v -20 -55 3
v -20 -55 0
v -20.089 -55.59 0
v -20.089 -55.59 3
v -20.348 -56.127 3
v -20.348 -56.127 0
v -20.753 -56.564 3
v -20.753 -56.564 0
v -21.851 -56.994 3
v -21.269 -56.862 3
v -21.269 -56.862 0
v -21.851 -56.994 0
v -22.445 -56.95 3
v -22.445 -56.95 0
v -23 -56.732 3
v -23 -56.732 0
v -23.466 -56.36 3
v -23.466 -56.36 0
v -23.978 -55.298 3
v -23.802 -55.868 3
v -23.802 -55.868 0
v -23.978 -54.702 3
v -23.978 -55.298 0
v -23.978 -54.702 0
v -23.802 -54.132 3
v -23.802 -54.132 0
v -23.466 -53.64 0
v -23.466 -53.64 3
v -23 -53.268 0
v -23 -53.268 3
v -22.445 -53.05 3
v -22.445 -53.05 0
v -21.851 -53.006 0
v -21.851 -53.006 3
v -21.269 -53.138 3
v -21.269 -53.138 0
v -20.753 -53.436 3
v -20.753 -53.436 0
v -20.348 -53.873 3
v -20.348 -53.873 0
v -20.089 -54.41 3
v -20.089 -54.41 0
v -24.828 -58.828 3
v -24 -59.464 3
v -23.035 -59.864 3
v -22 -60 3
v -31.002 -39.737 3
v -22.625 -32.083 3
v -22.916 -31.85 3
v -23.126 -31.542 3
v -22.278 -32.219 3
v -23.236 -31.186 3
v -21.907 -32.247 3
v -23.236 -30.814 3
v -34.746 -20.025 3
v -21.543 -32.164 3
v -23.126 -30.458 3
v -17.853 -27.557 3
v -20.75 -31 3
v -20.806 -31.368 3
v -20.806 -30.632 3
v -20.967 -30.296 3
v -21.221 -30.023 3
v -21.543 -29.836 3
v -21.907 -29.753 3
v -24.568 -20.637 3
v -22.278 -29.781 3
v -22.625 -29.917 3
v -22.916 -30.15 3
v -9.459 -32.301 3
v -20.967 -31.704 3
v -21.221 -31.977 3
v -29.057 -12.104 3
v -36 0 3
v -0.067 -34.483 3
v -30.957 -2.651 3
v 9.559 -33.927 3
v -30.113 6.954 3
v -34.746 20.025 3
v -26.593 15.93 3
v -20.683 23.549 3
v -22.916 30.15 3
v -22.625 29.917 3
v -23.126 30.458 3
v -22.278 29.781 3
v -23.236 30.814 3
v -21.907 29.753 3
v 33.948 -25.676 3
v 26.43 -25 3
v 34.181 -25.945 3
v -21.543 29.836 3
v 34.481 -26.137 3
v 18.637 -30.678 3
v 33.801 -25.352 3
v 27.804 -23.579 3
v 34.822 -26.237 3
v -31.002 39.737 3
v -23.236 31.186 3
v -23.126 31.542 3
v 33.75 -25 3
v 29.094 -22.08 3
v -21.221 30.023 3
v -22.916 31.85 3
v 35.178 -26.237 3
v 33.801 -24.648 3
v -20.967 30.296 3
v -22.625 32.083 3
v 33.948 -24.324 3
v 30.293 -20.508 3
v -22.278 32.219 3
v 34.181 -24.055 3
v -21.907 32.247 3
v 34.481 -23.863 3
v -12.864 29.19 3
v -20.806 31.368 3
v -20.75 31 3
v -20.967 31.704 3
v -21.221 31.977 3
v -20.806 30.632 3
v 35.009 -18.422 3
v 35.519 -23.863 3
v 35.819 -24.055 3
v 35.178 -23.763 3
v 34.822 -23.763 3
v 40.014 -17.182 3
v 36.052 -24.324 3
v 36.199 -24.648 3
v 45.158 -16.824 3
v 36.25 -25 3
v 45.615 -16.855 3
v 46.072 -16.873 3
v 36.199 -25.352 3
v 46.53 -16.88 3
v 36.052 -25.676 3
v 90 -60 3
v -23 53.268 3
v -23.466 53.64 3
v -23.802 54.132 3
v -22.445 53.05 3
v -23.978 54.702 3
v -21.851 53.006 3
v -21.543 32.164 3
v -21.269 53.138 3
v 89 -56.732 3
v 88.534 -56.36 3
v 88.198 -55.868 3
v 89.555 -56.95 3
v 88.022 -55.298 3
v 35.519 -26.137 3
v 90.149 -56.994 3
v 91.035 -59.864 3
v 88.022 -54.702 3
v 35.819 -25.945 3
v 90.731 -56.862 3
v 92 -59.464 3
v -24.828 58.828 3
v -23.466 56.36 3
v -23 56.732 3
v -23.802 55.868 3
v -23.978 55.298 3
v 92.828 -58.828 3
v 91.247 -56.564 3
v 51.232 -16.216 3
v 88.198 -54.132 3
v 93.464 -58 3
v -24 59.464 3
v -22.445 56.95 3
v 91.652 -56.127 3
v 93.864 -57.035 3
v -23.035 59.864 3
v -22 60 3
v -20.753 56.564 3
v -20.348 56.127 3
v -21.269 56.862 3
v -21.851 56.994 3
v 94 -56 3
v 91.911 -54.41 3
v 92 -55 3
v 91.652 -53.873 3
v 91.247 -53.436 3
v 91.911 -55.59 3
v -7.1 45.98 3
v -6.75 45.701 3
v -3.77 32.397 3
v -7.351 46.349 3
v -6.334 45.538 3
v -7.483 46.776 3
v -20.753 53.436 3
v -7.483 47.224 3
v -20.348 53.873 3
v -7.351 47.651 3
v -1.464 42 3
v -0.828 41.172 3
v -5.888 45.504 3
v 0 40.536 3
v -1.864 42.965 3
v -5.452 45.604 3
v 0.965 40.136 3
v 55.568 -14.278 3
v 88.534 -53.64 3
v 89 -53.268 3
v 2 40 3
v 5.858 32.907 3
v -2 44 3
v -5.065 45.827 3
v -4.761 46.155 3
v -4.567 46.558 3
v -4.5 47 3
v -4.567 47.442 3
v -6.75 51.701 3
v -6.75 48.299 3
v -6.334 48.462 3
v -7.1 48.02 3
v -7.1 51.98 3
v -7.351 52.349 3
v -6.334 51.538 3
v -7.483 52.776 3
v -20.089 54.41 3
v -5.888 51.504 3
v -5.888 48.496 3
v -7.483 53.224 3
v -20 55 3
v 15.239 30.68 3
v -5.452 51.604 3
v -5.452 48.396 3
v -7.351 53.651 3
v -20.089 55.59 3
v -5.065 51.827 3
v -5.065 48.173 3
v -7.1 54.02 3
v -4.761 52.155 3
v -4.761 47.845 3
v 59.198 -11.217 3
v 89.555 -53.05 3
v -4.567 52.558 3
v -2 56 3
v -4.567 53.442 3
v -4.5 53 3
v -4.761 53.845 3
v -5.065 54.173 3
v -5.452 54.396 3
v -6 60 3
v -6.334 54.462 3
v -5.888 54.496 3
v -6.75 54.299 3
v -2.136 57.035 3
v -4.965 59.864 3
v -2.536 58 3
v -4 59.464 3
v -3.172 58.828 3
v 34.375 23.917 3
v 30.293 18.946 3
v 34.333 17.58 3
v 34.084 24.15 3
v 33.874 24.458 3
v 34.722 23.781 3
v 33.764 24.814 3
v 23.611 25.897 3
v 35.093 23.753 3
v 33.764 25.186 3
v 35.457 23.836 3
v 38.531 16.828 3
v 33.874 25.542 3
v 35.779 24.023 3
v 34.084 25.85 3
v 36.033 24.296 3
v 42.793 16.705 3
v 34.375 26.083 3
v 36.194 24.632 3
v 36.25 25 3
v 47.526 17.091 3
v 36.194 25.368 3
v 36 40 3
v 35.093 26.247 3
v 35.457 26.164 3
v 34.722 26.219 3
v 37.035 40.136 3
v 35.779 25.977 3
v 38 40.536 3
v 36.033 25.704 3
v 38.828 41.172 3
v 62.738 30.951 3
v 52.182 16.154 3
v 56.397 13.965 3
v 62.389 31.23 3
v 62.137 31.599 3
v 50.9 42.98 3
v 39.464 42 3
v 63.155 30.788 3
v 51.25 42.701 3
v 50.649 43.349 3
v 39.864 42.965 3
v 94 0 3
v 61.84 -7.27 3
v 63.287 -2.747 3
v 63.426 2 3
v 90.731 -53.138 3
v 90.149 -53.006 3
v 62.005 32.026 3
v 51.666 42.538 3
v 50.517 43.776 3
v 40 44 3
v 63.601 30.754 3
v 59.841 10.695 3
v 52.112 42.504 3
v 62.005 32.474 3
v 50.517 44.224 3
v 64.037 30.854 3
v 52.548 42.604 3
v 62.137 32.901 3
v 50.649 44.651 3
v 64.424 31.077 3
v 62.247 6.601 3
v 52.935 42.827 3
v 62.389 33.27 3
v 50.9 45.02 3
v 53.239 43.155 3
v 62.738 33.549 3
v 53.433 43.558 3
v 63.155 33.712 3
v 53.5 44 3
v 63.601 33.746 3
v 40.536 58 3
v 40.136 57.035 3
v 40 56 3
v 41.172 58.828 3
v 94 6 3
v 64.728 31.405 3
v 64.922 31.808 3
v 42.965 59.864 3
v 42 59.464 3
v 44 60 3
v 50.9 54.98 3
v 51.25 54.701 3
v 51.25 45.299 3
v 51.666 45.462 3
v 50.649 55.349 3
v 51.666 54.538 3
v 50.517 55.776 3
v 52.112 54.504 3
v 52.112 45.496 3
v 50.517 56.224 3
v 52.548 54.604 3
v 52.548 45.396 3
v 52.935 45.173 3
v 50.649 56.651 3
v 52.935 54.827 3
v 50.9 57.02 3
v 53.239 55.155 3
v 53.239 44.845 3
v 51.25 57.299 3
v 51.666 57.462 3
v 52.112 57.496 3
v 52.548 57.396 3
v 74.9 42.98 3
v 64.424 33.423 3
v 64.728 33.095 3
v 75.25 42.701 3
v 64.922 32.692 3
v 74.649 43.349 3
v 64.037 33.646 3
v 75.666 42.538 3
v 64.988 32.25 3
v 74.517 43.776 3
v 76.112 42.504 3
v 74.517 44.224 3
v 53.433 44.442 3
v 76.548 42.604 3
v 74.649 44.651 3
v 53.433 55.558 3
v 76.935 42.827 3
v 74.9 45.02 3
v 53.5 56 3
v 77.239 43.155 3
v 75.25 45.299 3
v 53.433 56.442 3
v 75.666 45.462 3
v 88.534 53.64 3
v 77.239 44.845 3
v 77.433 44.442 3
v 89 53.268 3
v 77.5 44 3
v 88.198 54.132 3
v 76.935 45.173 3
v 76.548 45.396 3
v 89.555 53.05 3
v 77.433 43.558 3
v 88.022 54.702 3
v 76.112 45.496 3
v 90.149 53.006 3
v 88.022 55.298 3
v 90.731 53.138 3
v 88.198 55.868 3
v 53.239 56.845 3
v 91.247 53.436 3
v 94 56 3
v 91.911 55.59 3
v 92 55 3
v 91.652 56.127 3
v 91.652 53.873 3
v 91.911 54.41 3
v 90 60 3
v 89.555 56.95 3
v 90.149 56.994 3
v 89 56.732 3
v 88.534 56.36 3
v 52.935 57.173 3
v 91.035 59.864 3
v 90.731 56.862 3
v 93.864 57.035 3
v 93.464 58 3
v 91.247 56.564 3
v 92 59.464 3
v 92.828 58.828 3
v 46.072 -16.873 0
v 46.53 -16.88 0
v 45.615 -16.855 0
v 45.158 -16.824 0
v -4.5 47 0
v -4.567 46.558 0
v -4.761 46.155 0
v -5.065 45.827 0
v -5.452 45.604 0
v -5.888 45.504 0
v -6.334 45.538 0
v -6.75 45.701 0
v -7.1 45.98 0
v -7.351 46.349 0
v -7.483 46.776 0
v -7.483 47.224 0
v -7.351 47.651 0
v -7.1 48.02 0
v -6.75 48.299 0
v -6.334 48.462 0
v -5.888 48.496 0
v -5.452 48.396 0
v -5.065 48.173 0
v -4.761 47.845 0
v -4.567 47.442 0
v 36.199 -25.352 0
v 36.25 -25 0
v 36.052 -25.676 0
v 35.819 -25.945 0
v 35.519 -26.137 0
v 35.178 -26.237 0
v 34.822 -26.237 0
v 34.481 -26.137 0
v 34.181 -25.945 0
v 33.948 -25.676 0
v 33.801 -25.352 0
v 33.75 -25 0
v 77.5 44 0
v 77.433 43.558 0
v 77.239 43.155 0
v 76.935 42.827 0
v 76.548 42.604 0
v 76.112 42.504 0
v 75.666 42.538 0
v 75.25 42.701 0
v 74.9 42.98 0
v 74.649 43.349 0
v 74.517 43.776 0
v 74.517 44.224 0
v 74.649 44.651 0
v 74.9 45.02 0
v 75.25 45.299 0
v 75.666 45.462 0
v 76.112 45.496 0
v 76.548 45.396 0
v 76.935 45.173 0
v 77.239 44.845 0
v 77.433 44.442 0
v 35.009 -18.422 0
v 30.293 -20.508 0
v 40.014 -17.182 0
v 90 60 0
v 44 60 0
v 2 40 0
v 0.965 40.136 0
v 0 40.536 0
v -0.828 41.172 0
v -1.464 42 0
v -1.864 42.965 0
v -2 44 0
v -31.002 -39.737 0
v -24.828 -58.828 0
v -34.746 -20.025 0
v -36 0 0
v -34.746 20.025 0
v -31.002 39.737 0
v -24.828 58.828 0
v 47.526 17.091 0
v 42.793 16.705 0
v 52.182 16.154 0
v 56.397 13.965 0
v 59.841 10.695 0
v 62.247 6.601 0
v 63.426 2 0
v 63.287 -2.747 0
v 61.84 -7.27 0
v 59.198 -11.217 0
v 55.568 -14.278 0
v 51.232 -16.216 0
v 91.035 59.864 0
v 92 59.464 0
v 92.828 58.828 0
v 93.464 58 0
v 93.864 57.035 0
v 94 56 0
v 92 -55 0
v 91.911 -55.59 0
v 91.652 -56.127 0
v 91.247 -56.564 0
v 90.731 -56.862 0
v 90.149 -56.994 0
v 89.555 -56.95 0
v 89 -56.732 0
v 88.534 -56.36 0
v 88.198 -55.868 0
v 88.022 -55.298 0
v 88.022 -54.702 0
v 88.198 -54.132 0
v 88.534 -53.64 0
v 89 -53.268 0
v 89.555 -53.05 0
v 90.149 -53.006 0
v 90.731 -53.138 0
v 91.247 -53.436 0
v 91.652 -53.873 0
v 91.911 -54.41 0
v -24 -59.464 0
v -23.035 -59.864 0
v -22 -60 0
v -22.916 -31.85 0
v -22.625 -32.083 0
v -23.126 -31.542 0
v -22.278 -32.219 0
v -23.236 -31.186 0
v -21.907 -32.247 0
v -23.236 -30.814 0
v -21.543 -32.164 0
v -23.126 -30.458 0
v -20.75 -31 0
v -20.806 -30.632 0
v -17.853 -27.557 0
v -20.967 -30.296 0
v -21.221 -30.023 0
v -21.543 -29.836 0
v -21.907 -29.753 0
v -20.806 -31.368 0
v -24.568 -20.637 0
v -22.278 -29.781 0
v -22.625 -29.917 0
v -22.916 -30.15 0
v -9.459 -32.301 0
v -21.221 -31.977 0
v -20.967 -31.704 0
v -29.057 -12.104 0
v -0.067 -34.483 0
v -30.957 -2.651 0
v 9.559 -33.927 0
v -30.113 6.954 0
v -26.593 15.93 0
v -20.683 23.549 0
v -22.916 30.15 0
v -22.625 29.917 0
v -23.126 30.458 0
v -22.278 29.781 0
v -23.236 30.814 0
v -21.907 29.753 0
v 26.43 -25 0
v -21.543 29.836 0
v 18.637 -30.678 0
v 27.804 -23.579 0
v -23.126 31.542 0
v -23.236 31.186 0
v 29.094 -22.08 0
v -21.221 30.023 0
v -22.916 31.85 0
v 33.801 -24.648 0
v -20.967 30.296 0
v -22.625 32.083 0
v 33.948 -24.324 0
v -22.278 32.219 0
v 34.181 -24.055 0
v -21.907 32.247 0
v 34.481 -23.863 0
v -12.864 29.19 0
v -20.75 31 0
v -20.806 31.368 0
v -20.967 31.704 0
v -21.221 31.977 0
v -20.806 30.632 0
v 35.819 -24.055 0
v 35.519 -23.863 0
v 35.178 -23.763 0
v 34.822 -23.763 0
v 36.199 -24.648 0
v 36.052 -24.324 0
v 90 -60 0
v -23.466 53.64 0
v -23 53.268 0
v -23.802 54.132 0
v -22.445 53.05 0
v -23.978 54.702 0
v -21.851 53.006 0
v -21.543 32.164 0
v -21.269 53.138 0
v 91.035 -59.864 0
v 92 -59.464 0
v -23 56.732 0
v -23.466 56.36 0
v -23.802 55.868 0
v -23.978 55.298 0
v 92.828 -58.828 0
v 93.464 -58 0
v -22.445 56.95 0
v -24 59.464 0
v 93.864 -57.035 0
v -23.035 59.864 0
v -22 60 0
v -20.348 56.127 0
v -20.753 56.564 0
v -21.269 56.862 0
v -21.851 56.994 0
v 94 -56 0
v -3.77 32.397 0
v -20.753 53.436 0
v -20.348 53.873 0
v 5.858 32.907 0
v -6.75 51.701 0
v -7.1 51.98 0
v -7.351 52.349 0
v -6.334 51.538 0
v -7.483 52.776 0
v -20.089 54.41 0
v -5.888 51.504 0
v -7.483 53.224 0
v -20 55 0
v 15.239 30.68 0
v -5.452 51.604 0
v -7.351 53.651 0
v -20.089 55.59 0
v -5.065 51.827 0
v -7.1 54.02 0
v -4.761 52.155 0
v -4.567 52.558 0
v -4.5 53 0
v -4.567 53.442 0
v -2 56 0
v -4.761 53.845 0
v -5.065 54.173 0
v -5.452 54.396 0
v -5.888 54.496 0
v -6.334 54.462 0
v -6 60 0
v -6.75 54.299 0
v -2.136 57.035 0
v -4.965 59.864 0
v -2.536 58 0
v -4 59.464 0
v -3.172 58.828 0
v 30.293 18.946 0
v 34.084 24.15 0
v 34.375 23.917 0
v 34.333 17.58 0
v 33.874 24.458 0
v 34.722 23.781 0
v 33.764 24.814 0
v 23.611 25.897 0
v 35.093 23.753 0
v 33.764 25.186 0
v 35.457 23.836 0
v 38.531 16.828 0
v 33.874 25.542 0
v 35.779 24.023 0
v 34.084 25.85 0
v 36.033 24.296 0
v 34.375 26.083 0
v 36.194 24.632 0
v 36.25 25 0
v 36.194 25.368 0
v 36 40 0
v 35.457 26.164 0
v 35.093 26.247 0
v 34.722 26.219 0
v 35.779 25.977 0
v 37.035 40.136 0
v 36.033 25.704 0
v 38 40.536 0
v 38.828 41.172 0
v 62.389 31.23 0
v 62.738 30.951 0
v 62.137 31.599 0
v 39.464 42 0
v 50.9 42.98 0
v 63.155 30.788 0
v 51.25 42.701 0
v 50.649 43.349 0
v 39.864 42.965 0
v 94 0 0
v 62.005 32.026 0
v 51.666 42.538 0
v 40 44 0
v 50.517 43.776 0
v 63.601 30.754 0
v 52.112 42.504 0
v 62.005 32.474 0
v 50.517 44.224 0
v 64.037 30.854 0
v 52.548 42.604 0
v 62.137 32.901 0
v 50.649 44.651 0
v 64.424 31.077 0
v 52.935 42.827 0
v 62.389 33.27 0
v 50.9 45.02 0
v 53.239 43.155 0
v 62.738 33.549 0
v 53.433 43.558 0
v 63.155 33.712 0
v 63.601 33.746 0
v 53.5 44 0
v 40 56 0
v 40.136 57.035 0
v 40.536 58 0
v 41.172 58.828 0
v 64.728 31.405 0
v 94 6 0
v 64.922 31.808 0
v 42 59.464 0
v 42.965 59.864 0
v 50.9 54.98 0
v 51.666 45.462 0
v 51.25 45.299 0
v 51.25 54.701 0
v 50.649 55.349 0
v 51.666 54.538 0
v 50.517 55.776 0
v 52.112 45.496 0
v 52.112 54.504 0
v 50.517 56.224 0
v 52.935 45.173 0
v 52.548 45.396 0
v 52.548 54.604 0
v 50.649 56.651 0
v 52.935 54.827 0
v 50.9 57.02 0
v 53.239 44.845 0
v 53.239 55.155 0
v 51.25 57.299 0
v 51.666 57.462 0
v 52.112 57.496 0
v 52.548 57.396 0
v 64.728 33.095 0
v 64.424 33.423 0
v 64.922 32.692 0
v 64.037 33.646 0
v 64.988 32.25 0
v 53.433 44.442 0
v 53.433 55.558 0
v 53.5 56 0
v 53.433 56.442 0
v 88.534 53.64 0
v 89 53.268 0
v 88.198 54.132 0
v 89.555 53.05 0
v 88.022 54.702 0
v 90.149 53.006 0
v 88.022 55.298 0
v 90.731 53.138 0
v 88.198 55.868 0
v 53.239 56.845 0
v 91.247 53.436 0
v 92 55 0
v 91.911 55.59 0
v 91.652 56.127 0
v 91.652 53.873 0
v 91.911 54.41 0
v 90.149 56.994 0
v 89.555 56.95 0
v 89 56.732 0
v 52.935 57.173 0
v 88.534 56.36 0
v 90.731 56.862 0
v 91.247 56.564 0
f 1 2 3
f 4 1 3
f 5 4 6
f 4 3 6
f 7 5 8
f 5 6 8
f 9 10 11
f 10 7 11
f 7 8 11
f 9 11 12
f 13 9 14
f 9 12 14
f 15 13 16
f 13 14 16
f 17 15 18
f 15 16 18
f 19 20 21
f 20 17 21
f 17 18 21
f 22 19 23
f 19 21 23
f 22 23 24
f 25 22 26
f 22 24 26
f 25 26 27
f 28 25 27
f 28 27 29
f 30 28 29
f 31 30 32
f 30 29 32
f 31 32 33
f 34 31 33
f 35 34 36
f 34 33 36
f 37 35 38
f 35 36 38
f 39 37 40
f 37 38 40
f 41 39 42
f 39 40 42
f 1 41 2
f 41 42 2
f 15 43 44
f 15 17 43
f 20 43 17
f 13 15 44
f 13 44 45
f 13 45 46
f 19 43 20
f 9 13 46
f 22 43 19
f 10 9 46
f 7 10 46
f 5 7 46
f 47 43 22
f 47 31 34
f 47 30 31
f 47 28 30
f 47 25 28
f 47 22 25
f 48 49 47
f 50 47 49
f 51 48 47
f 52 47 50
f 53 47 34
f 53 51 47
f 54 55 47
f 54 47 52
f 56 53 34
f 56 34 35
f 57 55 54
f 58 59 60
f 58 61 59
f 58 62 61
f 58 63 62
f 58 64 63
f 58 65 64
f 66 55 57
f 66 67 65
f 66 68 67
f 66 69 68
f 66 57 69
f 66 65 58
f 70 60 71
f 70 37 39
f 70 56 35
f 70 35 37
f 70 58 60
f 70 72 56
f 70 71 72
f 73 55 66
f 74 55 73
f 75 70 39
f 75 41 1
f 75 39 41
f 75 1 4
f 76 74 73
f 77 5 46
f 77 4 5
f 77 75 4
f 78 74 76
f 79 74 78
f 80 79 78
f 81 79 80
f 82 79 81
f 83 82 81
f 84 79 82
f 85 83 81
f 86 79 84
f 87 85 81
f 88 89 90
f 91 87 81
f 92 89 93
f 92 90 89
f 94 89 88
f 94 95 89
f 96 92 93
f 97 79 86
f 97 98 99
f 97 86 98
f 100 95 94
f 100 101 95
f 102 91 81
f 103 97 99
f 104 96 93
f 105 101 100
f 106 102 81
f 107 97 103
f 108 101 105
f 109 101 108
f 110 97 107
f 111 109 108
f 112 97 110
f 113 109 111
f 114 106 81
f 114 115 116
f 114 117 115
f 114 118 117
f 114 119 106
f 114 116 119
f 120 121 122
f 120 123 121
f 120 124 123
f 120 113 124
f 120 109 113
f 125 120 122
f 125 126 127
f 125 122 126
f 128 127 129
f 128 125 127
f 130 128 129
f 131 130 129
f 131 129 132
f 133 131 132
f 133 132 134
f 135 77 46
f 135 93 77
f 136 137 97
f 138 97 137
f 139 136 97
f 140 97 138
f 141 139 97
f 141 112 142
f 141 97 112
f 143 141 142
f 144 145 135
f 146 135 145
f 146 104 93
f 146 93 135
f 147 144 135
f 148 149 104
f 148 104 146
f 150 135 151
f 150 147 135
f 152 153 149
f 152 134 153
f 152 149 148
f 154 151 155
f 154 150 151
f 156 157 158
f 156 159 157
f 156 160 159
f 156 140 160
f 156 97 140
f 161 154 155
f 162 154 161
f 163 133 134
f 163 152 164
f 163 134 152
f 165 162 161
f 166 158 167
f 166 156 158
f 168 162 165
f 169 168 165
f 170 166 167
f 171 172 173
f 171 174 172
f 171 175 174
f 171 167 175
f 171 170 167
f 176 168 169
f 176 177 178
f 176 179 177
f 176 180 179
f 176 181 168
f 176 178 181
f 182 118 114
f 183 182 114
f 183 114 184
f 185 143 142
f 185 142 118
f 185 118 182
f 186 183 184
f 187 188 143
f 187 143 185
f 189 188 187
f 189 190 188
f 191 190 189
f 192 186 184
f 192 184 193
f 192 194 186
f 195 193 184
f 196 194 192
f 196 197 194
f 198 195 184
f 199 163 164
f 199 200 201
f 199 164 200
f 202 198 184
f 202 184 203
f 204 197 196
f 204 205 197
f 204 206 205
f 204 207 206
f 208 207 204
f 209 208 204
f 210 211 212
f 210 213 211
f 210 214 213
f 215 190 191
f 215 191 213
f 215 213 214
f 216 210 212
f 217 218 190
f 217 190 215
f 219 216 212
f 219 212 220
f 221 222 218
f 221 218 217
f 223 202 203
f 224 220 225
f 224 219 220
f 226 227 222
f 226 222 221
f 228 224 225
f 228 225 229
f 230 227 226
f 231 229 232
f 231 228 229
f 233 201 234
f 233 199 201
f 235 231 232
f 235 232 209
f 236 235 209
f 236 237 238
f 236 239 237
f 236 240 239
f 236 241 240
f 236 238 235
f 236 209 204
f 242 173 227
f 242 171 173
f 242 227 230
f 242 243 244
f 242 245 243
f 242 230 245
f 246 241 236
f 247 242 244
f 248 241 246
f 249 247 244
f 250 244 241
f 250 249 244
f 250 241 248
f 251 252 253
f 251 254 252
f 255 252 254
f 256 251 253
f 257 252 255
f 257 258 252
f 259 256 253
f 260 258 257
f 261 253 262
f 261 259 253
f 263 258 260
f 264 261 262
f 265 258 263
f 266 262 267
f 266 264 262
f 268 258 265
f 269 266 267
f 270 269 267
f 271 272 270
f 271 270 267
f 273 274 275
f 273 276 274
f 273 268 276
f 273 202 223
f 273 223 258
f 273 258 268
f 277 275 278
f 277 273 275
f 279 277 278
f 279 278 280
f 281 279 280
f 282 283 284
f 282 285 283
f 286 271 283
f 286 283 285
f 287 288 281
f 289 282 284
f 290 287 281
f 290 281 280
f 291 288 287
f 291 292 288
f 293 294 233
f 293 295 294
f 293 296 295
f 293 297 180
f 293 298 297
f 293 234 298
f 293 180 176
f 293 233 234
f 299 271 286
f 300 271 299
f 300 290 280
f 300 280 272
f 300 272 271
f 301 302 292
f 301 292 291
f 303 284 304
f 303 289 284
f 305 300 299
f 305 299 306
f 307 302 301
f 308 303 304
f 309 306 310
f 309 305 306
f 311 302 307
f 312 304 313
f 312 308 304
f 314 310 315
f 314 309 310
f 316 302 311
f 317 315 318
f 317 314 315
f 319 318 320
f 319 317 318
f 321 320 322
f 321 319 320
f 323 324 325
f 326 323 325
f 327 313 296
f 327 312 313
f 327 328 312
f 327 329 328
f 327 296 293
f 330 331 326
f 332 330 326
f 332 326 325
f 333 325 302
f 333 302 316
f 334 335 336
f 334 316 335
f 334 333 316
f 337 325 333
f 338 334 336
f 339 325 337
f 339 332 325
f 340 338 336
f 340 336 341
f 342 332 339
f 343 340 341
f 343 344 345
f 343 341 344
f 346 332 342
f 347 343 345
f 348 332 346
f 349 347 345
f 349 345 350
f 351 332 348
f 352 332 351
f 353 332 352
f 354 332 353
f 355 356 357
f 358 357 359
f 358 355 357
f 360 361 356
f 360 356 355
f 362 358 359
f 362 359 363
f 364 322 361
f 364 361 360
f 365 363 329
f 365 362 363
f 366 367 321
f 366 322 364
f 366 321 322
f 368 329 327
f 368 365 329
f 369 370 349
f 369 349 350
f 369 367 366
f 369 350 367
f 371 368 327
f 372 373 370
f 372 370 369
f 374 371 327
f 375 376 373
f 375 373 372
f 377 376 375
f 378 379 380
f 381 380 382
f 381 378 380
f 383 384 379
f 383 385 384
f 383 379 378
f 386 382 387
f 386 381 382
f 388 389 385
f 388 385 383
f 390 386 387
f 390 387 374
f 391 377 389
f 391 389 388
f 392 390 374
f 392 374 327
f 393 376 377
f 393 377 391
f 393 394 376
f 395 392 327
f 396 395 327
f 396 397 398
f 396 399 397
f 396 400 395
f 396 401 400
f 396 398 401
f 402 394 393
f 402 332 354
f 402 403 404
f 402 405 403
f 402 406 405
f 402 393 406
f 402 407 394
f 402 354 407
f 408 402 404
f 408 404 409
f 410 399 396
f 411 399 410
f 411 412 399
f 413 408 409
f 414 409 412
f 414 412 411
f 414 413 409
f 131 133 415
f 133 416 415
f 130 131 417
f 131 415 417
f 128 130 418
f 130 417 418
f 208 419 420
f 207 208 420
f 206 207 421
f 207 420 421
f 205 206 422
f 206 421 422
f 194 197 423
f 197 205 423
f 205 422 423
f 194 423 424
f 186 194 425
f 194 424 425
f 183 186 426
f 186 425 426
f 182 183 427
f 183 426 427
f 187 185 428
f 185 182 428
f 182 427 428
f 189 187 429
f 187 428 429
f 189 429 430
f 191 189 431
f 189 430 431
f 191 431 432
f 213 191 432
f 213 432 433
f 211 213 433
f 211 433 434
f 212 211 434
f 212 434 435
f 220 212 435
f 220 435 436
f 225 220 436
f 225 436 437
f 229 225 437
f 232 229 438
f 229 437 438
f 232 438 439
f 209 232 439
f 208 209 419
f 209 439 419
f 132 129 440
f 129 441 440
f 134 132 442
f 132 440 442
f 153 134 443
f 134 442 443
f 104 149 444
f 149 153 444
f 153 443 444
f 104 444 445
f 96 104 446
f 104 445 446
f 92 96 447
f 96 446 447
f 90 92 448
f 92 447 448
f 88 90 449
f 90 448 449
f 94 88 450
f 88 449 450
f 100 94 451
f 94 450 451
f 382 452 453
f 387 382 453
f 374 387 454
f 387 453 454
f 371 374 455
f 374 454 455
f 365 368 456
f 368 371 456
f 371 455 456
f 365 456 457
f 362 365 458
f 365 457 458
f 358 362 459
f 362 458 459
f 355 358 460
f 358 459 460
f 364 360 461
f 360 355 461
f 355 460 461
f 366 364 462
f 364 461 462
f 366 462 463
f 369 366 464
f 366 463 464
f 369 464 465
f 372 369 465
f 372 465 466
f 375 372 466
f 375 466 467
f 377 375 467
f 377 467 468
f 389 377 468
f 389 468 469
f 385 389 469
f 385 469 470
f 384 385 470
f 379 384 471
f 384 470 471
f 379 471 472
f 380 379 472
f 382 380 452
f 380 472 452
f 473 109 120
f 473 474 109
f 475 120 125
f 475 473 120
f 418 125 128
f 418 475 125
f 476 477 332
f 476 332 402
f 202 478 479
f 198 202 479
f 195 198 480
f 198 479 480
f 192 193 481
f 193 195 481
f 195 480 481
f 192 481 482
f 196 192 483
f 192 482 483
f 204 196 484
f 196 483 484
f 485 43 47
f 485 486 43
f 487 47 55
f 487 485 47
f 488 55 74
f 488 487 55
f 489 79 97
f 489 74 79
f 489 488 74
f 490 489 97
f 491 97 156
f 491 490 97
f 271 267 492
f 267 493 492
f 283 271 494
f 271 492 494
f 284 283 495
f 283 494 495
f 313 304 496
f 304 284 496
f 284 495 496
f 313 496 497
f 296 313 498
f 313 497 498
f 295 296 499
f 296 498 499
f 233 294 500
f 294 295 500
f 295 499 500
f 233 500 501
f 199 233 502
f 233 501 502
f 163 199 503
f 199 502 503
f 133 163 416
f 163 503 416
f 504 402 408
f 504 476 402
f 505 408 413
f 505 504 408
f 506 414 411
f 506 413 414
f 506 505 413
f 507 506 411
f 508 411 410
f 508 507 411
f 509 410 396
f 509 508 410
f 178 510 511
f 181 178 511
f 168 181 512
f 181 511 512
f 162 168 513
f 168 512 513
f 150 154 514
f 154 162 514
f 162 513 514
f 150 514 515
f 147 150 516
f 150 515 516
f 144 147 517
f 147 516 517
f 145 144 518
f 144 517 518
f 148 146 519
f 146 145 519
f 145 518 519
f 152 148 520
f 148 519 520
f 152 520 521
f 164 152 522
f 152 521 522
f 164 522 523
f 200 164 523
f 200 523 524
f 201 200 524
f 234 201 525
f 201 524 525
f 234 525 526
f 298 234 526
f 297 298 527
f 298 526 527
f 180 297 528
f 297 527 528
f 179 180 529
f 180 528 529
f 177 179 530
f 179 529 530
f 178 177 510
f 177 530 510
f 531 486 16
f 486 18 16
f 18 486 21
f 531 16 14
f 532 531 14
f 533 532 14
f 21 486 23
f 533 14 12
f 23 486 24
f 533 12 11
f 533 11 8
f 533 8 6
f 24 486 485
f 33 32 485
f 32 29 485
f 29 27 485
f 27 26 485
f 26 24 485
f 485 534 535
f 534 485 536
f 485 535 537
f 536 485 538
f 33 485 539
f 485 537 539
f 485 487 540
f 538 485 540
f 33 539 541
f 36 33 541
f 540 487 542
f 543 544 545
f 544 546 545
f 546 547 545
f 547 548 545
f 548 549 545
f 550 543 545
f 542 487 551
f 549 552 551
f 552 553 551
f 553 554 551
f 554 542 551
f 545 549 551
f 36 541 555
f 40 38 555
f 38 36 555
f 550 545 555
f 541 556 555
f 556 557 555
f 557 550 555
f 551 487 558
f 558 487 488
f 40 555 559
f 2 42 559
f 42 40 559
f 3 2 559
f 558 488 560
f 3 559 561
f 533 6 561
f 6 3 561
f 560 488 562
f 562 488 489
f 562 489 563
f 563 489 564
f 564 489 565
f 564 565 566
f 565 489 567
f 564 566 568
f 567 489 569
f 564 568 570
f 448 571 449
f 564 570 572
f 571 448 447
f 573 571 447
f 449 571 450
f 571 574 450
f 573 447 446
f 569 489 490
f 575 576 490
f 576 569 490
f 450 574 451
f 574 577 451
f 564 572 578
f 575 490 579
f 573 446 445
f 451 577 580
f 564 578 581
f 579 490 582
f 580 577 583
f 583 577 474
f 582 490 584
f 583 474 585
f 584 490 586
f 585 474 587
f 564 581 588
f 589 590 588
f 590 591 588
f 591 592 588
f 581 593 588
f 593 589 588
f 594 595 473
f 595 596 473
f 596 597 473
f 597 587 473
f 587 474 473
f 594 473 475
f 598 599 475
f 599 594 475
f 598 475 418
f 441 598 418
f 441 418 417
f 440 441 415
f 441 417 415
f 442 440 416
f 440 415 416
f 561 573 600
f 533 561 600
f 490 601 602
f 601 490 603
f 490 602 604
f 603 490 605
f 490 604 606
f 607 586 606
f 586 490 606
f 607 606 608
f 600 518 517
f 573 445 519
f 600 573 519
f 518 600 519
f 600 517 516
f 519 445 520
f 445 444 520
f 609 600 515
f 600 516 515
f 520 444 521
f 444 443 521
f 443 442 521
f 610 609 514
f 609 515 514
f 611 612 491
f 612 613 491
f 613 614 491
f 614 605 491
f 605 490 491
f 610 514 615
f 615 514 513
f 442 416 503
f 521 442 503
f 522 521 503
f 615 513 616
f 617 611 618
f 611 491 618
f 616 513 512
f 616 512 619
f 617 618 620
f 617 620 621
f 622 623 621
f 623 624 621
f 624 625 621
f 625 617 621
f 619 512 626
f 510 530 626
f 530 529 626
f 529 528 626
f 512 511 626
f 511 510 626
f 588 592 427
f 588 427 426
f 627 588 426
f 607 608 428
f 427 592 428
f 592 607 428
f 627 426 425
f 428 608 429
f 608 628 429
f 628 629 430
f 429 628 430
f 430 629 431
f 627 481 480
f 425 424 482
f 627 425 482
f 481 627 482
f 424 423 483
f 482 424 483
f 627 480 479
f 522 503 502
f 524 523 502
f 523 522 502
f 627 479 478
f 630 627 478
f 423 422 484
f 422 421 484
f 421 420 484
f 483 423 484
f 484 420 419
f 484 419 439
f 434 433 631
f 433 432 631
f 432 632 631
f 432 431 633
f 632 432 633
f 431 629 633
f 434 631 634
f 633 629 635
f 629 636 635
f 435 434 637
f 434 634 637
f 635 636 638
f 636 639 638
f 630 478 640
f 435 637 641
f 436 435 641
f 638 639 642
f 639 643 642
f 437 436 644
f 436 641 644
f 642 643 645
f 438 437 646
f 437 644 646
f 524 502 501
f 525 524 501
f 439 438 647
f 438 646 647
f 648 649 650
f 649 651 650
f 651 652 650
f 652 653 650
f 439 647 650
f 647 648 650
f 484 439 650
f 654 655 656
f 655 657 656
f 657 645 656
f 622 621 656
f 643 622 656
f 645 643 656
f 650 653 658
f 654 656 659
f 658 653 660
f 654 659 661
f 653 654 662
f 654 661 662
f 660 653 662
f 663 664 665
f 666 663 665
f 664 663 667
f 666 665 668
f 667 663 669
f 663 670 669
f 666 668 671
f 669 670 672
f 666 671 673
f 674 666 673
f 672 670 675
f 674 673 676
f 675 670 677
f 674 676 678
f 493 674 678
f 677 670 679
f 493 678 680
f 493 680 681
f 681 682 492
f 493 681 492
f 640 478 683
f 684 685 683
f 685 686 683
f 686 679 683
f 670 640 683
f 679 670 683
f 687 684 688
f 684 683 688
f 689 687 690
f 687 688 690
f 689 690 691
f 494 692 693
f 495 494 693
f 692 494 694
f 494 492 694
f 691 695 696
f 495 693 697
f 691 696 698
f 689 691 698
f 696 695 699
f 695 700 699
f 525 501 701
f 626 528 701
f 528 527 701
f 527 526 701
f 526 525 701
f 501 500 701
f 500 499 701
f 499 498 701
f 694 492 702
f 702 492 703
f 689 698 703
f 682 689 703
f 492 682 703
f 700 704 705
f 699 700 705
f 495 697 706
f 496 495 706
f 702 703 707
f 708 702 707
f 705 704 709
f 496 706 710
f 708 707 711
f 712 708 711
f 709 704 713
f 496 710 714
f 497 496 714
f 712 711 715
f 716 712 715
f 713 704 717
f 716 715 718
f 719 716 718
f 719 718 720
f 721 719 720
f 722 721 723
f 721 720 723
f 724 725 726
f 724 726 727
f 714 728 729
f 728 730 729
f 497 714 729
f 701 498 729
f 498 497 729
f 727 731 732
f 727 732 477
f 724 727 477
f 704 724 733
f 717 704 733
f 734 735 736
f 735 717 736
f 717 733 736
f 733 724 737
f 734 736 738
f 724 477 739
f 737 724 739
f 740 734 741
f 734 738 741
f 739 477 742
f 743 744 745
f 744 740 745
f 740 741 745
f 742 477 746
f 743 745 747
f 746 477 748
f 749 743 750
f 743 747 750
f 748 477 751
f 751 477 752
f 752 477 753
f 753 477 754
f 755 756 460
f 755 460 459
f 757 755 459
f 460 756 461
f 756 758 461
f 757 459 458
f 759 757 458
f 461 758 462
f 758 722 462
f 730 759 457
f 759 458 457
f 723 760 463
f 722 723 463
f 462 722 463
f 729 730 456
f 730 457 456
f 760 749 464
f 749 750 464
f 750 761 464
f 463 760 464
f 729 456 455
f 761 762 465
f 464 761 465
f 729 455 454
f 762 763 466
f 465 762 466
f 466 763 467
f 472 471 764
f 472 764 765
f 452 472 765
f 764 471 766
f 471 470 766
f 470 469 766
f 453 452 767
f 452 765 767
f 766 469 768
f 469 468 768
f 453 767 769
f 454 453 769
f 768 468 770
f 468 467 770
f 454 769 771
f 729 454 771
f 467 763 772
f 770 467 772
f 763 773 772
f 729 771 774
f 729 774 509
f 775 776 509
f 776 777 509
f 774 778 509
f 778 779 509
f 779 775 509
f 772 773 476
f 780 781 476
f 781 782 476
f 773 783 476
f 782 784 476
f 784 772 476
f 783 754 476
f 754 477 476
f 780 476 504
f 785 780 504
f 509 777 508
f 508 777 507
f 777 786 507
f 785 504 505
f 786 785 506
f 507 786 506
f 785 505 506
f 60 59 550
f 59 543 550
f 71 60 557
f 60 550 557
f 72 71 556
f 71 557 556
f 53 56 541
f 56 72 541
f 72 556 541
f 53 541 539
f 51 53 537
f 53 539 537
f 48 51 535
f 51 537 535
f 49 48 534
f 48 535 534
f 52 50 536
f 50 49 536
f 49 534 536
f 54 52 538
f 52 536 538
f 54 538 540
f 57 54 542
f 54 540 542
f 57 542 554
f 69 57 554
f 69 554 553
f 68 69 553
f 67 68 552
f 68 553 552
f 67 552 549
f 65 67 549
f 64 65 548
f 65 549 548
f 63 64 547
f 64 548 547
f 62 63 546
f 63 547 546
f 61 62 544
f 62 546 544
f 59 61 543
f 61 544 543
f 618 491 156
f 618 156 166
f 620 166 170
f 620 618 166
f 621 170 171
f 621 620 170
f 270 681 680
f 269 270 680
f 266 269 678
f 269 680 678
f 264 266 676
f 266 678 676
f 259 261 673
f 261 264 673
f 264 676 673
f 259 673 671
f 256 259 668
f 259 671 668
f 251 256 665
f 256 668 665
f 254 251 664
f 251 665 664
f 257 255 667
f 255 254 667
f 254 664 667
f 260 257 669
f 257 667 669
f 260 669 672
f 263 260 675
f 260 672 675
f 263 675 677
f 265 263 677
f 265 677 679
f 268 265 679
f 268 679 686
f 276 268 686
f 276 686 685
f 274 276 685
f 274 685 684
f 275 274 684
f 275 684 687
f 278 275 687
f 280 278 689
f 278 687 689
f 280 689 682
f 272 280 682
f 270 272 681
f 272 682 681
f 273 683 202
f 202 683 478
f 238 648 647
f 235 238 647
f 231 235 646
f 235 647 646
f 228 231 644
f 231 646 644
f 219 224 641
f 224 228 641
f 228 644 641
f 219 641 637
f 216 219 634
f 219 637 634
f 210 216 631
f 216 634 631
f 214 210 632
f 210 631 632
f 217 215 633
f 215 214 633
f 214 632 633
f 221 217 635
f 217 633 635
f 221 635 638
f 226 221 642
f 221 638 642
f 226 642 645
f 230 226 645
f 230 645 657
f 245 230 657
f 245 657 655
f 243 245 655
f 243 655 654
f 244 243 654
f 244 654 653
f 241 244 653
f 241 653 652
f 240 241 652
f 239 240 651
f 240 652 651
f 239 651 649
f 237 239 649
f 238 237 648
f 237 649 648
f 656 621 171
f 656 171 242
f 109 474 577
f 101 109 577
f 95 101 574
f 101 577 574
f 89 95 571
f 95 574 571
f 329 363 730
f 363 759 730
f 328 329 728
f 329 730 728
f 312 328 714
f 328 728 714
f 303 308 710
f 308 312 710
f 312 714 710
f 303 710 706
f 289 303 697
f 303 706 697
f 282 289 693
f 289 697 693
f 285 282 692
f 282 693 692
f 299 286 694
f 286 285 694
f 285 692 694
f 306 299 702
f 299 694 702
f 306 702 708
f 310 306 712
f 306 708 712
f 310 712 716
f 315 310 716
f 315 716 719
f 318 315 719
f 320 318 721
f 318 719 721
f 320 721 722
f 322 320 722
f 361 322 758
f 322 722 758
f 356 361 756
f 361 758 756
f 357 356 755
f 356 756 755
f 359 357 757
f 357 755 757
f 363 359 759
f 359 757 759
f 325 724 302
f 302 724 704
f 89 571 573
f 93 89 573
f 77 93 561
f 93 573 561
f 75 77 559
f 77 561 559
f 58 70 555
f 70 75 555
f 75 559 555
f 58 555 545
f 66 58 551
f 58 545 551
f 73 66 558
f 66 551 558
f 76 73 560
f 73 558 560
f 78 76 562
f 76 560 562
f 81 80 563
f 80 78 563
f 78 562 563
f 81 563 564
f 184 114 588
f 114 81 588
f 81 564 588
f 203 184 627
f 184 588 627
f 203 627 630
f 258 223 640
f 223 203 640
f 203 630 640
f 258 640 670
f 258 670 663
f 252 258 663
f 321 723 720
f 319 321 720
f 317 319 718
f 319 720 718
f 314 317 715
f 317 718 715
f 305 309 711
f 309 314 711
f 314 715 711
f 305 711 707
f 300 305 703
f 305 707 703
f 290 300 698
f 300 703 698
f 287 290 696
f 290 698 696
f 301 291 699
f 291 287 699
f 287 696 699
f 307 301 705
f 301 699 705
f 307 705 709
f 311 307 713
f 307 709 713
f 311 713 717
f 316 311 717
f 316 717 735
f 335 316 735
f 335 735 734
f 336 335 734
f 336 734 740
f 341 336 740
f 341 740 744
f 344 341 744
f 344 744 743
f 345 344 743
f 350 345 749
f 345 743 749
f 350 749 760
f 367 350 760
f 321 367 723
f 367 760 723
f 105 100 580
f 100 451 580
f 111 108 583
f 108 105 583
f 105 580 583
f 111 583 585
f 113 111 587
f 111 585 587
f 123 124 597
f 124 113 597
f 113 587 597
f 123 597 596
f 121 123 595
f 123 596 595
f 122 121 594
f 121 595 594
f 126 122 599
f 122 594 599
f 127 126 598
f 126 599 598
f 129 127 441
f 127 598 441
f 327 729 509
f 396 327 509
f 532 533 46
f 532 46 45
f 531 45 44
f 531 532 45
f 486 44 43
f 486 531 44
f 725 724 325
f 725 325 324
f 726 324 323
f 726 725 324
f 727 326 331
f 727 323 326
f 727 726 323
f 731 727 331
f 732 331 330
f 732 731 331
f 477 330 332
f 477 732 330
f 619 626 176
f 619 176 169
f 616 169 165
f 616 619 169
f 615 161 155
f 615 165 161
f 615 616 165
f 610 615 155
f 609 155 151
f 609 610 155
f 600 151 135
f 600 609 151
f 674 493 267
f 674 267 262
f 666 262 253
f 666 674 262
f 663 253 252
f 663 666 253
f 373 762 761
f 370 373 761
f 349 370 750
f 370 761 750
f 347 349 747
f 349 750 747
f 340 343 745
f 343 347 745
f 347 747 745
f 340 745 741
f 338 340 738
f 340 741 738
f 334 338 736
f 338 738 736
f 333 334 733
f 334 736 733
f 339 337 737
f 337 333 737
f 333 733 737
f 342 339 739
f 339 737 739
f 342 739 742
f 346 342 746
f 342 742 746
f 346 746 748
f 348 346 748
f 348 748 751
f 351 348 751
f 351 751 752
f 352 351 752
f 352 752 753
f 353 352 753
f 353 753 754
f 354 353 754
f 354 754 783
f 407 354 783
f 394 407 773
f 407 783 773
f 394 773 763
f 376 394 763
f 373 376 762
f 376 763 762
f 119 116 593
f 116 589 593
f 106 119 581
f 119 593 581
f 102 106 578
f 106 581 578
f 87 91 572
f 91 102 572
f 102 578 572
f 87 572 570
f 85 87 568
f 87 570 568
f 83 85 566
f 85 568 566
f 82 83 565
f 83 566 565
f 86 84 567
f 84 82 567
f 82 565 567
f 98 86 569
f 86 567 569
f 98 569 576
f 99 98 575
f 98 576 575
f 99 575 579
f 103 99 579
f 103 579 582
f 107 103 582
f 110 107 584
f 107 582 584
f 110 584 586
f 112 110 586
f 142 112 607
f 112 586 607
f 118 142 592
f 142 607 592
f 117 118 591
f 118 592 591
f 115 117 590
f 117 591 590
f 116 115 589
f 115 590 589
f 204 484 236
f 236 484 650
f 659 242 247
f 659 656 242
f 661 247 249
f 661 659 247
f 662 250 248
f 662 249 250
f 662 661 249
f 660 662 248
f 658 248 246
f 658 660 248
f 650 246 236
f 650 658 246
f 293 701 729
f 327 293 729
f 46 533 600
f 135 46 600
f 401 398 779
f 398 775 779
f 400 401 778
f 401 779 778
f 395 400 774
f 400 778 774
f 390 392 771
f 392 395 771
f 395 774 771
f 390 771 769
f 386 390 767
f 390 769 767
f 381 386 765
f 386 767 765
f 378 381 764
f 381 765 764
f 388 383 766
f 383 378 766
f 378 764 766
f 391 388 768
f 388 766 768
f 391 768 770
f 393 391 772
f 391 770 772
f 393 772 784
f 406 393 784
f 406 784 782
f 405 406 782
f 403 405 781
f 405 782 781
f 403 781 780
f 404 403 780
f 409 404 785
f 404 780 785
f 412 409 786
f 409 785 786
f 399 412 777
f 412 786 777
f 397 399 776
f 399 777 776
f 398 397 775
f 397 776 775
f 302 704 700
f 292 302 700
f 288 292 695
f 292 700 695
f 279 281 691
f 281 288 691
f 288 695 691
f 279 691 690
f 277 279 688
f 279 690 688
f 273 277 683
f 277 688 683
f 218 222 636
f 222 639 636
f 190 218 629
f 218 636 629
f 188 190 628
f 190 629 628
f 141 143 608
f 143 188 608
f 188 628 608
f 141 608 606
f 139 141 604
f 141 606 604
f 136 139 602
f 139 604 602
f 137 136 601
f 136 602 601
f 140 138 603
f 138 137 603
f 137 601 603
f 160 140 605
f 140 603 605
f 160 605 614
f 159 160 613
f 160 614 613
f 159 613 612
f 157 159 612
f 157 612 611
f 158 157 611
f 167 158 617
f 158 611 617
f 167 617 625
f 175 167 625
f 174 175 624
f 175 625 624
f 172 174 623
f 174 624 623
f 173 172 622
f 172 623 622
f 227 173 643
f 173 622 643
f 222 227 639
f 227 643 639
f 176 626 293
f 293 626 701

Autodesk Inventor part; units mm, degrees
ref_plane "YZ Plane" through (0, 0, 0) normal (1, 0, 0) x (0, 1, 0)
ref_plane "XZ Plane" through (0, 0, 0) normal (0, 1, 0) x (-1, 0, 0)
ref_plane "XY Plane" through (0, 0, 0) normal (0, 0, 1) x (1, 0, 0)
sketch "Эскиз1" plane through (0, 0, 0) normal (0, 0, 1) x (1, 0, 0)
  line L0 (0, 29) -> (0, -30)
  circle A0 centre (35, 25) radius 1.25
  circle A1 centre (-22, 31) radius 1.25
  circle A2 centre (-22, -31) radius 1.25
  circle A3 centre (35, -25) radius 1.25
  arc A4 (45.1579, -16.824) -> (42.7931, 16.7046) centre (46.5307, 0.1205) ccw
  line L1 (35, -25) -> (0, -25)
  circle A5 centre (-22, -55) radius 2
  circle A6 centre (90, -55) radius 2
  circle A7 centre (90, 55) radius 2
  circle A8 centre (-22, 55) radius 2
  line L2 (-22, -60) -> (90, -60)
  line L3 (94, -56) -> (94, 56)
  arc A9 (94, 56) -> (90, 60) centre (90, 56) ccw
  arc A10 (90, -60) -> (94, -56) centre (90, -56) ccw
  arc A11 (-24.8284, -58.8284) -> (-22, -60) centre (-22, -56) ccw
  arc A12 (-22, 60) -> (-24.8284, 58.8284) centre (-22, 56) ccw
  line L4 (94, 0) -> (94, 6)
  circle A13 centre (52, 44) radius 1.5
  circle A14 centre (52, 56) radius 1.5
  line L5 (-22, 60) -> (-6, 60)
  line L6 (44, 60) -> (90, 60)
  arc A15 (46.5295, -16.8795) -> (30.2933, -20.5081) centre (44.6409, -46.5678) ccw
  arc A16 (30.2933, 18.9458) -> (42.7931, 16.7046) centre (41.489, 45.4087) ccw
  line L7 (36, 40) -> (2, 40)
  line L8 (-2, 44) -> (-2, 56)
  line L9 (40, 56) -> (40, 44)
  arc A17 (44, 60) -> (40, 56) centre (44, 56) ccw
  arc A18 (36, 40) -> (40, 44) centre (36, 44) ccw
  arc A19 (-2, 44) -> (2, 40) centre (2, 44) ccw
  arc A20 (-2, 56) -> (-6, 60) centre (-6, 56) ccw
  circle A21 centre (-6, 53) radius 1.5
  circle A22 centre (-6, 47) radius 1.5
  arc A23 (-24.8284, 58.8284) -> (-24.8284, -58.8284) centre (124.4782, 0) ccw
  circle A24 centre (63.4885, 32.25) radius 1.5
  circle A25 centre (76, 44) radius 1.5
  arc A26 (30.2933, 18.9458) -> (30.2933, -20.5081) centre (2.8162, -0.7812) ccw
  point P0 (0, 0)
  point P1 (-26, -60)
  point P2 (94, -60)
  dimension "d3" = 2.5
  dimension "d4" = 2.5
  dimension "d5" = 2.5
  dimension "d6" = 2.5
  dimension "d10" = 50
  dimension "d11" = 34
  dimension "d39" = 4
  dimension "d44" = 120
  dimension "d46" = 4
  dimension "d70" = 4
  dimension "d71" = 3
  dimension "d72" = 3
  dimension "d75" = 3
  dimension "d76" = 3
extrude "Выдавливание4" add sketch "Эскиз1" along normal blind 3
properties part number "06-01-Платформа для лидара"
